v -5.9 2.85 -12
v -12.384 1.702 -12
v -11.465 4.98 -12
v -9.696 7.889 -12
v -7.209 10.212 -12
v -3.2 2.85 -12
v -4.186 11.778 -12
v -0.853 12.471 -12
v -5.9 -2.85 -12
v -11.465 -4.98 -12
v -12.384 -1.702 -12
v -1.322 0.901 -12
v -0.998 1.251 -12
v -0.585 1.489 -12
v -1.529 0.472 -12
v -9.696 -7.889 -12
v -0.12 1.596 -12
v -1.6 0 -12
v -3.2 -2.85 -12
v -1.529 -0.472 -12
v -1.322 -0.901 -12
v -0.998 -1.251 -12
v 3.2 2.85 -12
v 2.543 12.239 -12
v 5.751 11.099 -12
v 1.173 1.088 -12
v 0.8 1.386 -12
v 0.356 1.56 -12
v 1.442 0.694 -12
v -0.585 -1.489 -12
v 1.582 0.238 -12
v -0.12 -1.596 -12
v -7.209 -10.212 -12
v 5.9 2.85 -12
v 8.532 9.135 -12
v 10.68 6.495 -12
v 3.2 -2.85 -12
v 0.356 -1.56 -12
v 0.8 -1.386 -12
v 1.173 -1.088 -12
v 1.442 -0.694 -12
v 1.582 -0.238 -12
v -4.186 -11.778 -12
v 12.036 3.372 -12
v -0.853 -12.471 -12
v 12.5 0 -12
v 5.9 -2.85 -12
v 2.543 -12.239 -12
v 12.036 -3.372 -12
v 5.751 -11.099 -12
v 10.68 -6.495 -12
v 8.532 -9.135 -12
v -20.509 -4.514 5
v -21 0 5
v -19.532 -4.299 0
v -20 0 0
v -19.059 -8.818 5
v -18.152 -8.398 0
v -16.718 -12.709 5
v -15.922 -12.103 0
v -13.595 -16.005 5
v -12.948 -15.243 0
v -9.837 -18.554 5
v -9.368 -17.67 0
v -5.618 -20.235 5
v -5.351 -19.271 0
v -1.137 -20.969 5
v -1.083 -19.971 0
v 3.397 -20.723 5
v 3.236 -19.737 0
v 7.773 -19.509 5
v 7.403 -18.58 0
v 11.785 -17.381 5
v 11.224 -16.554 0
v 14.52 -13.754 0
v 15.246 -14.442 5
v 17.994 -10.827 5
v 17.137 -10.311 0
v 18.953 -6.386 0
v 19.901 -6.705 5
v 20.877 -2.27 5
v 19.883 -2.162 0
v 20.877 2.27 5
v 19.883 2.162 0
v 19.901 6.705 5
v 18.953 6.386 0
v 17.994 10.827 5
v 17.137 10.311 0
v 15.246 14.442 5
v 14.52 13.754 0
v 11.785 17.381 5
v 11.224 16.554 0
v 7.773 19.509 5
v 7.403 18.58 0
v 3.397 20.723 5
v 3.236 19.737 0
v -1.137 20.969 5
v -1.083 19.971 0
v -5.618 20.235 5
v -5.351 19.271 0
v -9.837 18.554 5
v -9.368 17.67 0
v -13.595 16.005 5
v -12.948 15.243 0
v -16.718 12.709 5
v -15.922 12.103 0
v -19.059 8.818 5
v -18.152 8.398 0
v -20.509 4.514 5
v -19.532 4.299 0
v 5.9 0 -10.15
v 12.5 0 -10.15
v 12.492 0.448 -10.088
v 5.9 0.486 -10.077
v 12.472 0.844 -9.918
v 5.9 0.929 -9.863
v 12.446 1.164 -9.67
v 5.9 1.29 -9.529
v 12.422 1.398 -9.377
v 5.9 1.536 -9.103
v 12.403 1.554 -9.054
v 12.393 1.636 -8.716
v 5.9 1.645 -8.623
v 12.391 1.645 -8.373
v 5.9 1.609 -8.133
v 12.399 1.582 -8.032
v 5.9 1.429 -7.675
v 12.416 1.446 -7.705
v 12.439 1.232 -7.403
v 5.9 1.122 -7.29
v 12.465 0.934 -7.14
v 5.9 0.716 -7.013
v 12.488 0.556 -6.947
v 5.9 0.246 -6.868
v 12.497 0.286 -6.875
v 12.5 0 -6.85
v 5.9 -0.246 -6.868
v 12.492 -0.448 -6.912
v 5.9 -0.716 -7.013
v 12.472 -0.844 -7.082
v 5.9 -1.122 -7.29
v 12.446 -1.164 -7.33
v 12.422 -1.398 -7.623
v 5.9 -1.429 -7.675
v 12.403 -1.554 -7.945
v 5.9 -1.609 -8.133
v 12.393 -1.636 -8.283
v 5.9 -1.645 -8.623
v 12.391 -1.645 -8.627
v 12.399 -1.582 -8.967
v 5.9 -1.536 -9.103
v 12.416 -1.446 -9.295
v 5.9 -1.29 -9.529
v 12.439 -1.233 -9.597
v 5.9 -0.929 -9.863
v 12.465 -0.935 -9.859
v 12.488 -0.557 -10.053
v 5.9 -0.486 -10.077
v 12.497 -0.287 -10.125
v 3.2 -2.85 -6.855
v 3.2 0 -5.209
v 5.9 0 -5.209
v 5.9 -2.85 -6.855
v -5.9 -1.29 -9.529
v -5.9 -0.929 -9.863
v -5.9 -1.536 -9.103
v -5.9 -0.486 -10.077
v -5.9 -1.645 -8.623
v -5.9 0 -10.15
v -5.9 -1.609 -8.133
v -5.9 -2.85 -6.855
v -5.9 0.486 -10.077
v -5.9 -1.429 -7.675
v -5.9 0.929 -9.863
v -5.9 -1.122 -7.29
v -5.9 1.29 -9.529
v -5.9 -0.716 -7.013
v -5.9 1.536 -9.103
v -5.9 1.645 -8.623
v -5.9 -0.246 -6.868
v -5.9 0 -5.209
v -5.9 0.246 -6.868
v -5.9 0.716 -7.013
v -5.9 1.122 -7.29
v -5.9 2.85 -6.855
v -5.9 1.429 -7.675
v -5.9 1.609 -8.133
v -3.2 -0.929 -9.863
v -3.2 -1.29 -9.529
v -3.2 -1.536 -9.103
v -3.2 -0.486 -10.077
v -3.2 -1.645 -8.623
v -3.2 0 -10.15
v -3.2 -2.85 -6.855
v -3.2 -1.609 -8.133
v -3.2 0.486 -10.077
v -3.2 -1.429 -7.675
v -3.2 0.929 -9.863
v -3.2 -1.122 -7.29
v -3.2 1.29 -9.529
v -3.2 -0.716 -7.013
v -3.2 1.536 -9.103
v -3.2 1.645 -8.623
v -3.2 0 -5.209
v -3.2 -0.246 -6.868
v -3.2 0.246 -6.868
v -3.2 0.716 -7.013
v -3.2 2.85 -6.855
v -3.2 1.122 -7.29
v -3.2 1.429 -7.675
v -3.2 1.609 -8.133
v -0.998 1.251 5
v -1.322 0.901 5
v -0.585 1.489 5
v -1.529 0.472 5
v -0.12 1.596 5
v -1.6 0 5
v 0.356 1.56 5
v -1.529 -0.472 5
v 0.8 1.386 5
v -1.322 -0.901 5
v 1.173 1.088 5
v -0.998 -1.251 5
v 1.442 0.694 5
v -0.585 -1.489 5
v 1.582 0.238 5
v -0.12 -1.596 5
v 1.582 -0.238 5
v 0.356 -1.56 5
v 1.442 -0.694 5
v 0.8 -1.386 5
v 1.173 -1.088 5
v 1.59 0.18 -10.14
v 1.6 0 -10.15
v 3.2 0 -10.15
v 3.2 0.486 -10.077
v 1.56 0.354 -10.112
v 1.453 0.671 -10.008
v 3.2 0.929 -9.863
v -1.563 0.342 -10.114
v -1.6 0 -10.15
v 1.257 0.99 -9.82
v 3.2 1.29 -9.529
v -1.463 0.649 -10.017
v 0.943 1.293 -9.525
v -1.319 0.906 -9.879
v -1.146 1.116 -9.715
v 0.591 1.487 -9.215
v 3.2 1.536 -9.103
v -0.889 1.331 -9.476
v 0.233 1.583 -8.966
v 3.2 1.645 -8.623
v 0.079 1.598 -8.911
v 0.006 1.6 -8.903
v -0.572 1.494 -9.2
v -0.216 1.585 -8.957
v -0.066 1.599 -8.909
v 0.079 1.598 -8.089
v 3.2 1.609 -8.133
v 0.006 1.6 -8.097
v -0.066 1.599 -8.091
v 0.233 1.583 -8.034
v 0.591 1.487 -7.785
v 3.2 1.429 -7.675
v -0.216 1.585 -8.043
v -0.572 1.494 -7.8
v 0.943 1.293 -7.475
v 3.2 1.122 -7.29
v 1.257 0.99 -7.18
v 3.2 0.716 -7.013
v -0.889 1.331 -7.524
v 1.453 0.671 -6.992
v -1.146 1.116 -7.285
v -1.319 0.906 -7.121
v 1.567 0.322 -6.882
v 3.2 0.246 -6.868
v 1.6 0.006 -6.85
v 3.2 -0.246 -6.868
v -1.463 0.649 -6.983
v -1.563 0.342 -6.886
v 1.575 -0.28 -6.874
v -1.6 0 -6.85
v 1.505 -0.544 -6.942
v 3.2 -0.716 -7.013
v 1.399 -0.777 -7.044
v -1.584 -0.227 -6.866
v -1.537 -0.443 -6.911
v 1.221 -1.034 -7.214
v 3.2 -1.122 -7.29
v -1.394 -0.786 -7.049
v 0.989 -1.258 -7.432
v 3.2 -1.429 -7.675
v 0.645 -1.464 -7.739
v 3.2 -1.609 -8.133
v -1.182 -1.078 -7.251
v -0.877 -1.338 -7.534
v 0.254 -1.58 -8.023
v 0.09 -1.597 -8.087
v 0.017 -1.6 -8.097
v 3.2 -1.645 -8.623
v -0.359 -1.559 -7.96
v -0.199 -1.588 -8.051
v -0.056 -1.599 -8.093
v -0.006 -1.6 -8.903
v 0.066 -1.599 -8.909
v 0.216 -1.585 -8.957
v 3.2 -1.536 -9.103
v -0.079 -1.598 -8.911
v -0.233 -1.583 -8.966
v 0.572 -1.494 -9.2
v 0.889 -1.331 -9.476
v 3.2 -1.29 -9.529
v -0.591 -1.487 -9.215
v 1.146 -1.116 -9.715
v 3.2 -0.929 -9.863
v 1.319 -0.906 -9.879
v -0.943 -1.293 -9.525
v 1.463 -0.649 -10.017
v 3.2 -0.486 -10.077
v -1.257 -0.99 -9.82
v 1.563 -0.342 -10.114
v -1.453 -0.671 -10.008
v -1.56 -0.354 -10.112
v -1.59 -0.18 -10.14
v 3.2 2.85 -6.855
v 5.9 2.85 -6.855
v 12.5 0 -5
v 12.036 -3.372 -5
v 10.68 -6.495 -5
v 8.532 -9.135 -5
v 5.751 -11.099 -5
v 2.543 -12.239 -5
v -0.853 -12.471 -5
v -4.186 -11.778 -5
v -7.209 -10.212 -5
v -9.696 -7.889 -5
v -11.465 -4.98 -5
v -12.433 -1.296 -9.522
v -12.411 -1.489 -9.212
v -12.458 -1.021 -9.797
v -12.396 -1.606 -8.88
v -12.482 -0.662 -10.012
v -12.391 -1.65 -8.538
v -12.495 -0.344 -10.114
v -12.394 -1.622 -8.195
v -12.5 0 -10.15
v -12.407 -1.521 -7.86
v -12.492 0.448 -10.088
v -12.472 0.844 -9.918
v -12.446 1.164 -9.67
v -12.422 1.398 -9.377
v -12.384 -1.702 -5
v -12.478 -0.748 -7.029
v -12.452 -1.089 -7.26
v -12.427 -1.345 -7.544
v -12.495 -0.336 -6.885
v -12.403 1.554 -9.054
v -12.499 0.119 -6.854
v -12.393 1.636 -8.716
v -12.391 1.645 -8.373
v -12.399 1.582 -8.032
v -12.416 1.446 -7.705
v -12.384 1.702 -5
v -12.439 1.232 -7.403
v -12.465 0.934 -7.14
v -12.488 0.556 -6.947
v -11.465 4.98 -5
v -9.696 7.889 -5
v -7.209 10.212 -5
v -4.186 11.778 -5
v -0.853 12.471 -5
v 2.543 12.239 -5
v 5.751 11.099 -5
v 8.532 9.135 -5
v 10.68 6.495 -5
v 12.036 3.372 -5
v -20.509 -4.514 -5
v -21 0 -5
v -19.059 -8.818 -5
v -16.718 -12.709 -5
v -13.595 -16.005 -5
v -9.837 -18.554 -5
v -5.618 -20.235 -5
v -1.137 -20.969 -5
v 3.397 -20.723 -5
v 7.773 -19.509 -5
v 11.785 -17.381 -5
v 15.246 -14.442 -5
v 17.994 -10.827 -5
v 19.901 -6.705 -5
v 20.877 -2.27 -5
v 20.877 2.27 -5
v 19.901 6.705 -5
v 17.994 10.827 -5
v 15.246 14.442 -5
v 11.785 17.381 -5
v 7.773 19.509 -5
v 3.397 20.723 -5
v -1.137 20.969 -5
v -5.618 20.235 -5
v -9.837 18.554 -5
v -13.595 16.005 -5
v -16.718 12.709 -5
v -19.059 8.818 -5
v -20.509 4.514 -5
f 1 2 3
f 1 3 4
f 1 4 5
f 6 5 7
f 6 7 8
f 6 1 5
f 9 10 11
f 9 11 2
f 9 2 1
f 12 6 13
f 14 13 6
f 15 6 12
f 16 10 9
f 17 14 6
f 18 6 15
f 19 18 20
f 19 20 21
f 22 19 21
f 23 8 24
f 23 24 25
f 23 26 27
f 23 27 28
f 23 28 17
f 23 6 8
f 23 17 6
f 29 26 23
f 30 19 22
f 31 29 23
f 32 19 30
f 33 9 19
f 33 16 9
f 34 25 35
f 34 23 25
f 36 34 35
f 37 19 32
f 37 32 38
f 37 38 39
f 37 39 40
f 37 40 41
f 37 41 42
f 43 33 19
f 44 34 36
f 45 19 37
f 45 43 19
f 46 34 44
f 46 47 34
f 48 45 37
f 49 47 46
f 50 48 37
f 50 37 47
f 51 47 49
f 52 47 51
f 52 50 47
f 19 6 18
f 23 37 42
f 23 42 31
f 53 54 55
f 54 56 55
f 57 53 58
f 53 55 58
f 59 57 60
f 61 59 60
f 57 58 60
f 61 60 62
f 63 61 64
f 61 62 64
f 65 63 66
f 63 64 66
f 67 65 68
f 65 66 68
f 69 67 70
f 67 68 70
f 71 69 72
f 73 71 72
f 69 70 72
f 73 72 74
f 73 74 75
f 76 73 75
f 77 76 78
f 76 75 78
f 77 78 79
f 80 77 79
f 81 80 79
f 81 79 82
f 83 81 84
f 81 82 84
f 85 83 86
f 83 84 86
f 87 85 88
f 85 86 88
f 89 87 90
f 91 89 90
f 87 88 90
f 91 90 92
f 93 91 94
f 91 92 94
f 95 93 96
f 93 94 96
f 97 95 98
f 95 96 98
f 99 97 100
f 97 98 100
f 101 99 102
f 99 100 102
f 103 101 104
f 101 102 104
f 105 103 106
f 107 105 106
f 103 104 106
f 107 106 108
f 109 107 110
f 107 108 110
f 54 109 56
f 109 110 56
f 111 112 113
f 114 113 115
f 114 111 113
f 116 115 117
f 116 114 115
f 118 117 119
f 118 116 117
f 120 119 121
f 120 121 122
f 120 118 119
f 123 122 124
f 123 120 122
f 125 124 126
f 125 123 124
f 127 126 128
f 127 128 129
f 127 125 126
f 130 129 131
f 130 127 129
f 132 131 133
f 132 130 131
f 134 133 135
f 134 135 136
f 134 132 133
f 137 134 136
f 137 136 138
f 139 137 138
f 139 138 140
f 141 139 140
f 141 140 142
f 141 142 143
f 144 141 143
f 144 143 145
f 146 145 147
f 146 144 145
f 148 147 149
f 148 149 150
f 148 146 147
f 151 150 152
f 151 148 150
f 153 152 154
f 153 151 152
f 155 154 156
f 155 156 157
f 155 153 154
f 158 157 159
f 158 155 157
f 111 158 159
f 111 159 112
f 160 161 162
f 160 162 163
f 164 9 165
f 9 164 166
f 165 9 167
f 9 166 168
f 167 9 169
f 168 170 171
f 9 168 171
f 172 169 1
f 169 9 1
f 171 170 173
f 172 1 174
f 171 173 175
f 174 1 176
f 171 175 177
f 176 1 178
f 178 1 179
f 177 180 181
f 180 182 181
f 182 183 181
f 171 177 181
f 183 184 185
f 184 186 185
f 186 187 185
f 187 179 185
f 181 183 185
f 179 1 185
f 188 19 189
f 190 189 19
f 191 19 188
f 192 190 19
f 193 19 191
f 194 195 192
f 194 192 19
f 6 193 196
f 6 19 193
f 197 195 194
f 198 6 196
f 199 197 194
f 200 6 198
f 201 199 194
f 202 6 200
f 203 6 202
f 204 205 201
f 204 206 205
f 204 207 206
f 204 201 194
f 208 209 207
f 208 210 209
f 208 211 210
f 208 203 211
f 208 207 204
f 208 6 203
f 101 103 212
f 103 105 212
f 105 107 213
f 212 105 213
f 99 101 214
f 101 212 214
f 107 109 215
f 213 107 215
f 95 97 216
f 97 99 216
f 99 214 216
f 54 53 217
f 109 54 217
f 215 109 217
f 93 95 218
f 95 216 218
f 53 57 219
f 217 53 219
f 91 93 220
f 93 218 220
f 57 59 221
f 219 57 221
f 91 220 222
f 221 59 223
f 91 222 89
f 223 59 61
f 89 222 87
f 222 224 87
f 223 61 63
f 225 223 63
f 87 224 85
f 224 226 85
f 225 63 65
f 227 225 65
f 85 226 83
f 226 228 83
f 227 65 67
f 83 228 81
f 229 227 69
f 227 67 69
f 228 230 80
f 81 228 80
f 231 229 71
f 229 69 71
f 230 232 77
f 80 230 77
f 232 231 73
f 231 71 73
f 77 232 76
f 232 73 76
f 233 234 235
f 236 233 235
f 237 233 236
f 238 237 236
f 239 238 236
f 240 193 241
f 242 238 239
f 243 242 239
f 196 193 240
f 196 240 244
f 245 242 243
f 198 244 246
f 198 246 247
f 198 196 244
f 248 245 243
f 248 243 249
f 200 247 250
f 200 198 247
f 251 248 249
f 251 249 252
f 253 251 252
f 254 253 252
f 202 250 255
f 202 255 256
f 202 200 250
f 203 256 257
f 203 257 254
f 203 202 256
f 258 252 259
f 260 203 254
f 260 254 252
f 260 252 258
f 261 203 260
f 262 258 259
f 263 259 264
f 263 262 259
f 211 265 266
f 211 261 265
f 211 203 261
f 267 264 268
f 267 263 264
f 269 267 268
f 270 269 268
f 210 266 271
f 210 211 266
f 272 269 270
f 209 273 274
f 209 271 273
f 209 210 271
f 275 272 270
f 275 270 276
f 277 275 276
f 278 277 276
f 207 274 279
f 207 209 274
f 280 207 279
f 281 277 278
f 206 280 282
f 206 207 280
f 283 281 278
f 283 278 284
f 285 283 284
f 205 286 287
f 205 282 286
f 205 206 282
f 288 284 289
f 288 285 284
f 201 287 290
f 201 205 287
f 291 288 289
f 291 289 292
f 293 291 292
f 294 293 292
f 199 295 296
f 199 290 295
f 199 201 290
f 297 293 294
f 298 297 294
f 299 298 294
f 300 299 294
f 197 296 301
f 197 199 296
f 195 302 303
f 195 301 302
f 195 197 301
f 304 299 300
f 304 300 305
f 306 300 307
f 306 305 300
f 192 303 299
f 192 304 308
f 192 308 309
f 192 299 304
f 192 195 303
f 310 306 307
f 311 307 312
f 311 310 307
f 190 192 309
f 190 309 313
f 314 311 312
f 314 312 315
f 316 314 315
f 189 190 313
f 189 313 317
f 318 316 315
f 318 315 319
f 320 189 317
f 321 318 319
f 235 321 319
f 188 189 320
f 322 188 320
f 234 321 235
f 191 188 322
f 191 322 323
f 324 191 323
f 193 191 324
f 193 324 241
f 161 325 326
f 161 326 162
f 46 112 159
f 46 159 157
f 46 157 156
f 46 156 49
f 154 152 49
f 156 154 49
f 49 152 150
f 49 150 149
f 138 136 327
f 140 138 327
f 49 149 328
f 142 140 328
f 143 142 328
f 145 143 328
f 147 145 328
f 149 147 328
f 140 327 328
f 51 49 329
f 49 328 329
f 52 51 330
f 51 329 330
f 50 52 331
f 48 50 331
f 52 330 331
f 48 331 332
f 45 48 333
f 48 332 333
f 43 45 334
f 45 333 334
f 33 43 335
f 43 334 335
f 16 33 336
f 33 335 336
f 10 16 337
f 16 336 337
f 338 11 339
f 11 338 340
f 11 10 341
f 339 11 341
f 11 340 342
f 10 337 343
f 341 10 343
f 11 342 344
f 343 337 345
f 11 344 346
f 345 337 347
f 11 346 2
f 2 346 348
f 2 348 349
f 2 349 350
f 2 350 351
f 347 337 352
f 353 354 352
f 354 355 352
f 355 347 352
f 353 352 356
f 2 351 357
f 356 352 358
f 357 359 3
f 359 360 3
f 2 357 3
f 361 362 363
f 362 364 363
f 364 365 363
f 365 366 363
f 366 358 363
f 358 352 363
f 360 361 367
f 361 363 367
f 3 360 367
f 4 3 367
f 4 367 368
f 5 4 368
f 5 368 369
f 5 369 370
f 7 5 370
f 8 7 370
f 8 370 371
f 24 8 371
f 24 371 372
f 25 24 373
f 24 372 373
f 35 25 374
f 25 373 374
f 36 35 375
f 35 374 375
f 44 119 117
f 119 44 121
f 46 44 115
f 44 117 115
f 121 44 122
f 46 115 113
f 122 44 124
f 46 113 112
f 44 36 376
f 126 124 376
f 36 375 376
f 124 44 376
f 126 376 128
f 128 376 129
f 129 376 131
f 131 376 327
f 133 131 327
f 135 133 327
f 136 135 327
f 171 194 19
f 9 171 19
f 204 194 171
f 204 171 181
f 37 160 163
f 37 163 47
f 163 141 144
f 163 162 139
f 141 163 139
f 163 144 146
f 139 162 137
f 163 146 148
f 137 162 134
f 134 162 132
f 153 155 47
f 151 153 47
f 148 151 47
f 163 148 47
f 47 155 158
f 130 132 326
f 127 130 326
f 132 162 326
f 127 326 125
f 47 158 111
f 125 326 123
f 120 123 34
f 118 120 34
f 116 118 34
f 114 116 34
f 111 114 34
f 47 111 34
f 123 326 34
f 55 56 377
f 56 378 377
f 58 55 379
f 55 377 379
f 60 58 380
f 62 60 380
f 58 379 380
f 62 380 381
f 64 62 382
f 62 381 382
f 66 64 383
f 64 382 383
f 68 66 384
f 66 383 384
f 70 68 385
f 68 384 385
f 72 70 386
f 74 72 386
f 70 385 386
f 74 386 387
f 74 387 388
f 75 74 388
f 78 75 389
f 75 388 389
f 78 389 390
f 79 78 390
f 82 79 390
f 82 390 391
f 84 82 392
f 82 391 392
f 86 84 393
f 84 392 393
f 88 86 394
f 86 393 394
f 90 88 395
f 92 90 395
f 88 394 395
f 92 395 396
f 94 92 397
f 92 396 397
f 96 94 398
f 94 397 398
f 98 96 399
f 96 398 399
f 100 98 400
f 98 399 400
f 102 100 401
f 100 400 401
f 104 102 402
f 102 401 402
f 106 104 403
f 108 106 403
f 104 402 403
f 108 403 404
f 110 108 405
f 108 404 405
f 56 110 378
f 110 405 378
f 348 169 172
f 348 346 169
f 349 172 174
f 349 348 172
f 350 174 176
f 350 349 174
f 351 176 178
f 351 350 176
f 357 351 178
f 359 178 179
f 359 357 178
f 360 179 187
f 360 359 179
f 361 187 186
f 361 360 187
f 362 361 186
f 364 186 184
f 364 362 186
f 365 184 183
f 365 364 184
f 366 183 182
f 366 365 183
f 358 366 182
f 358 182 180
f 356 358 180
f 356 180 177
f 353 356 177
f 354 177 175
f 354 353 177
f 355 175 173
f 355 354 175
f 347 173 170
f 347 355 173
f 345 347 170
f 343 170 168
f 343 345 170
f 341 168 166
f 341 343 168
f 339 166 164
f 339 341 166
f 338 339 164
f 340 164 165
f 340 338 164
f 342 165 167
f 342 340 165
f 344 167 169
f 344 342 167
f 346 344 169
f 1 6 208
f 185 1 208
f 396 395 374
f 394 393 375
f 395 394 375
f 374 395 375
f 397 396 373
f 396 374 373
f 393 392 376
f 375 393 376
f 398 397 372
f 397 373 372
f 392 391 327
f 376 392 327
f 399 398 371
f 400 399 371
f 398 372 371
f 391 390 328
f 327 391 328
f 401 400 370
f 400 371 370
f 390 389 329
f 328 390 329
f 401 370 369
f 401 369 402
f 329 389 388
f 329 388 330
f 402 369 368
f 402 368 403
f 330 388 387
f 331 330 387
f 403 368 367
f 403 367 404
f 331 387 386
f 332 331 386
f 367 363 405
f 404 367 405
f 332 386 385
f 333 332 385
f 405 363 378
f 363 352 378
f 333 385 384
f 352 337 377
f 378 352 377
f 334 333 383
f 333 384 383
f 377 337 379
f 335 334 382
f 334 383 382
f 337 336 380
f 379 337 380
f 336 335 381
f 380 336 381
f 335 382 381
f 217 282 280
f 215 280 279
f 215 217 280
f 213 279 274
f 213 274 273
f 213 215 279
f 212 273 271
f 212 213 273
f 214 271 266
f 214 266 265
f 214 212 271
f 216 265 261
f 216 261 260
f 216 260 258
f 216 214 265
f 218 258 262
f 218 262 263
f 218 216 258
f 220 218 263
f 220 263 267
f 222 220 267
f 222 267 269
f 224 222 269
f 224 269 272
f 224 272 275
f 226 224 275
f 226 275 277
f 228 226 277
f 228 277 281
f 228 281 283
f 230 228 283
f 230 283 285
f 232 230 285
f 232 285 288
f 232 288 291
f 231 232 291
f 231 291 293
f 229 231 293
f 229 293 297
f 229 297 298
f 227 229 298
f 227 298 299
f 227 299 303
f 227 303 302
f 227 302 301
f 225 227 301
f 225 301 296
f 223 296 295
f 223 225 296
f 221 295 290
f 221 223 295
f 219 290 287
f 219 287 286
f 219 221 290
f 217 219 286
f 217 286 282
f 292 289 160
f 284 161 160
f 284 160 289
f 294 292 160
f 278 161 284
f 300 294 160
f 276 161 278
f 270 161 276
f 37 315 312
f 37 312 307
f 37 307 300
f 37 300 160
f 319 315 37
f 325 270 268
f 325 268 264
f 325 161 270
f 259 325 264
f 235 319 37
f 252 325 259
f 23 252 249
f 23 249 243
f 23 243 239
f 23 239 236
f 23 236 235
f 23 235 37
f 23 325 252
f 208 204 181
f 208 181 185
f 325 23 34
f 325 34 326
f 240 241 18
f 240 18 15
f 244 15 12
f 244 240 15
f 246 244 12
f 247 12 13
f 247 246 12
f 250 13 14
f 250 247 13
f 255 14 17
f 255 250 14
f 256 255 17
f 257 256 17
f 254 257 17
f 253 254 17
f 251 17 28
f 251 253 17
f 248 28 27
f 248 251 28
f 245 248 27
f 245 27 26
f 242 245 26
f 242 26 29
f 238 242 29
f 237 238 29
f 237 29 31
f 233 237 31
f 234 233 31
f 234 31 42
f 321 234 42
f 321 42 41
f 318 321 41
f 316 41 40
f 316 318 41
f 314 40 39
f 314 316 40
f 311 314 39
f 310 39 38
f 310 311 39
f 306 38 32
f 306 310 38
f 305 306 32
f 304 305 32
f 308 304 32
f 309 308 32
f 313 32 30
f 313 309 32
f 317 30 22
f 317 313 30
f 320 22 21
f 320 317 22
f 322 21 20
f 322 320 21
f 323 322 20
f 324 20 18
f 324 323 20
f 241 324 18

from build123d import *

# Parameters (mm, degrees)
SKETCH4_R               = 12.5
BOSS_EXTRUDE1_DEPTH     = 7
CUT_EXTRUDE1_DEPTH      = 32.336879232
CUT_EXTRUDE1_DEPTH_BACK = 32.336879232
SKETCH3_R               = 1.6
CUT_EXTRUDE2_DEPTH      = 33.031234756
CUT_EXTRUDE2_DEPTH_BACK = 33.031234756
SKETCH5_R               = 1.65
CUT_EXTRUDE3_DEPTH      = 2.7
CUT_EXTRUDE4_DEPTH      = 2.7


with BuildPart() as part:
    # Sketch2 → Revolve1 (revolve)
    with BuildSketch(Plane(origin=(0, 0, 0), x_dir=(1, 0, 0), z_dir=(0, 1, 0)), mode=Mode.PRIVATE) as revolve1_sk:
        Polygon((0, 5), (0, -5), (21, -5), (20, 0), (21, 5), align=None)
    revolve(revolve1_sk.sketch.rotate(Axis((0, 0, -5), (0, 0, 1)), 180), axis=Axis((0, 0, -5), (0, 0, 1)))

    # Sketch4 → Boss-Extrude1 (add)
    with BuildSketch(Plane(origin=(0, 0, -5), x_dir=(-1, 0, 0), z_dir=(0, 0, -1))):
        with Locations(Location((0, 0, 0), (0, 0, 180))):
            Circle(SKETCH4_R)
    extrude(amount=BOSS_EXTRUDE1_DEPTH)

    # Sketch3 → Cut-Extrude1 (cut, two sides: drawn at the far end of the back side and taken through both)
    with BuildSketch(Plane(origin=(0, 0, -5), x_dir=(-1, 0, 0), z_dir=(0, 0, -1)).offset(-CUT_EXTRUDE1_DEPTH_BACK)):
        Circle(SKETCH3_R)
    extrude(amount=CUT_EXTRUDE1_DEPTH + CUT_EXTRUDE1_DEPTH_BACK, mode=Mode.SUBTRACT)

    # Sketch5 → Cut-Extrude2 (cut, two sides: drawn at the far end of the back side and taken through both)
    with BuildSketch(Plane(origin=(0, 0, 0), x_dir=(0, 0, -1), z_dir=(1, 0, 0)).offset(-CUT_EXTRUDE2_DEPTH_BACK)):
        with Locations((8.5, 0)):
            Circle(SKETCH5_R)
    extrude(amount=CUT_EXTRUDE2_DEPTH + CUT_EXTRUDE2_DEPTH_BACK, mode=Mode.SUBTRACT)

    # Sketch6 → Cut-Extrude3 (cut)
    with BuildSketch(Plane(origin=(-3.2, 0, 0), x_dir=(0, 0, -1), z_dir=(1, 0, 0))):
        Polygon((10.145448267, 2.85), (12, 2.85), (12, -2.85), (10.145448267, -2.85), (6.854551733, -2.85), (5.209103466, 0), (6.854551733, 2.85), align=None)
    extrude(amount=-CUT_EXTRUDE3_DEPTH, mode=Mode.SUBTRACT)

    # Sketch7 → Cut-Extrude4 (cut)
    with BuildSketch(Plane(origin=(3.2, 0, 0), x_dir=(0, 0, -1), z_dir=(1, 0, 0))):
        Polygon((12, 2.85), (10.145448267, 2.85), (6.854551733, 2.85), (5.209103466, 0), (6.854551733, -2.85), (10.145448267, -2.85), (12, -2.85), align=None)
    extrude(amount=CUT_EXTRUDE4_DEPTH, mode=Mode.SUBTRACT)


solid = part.part
